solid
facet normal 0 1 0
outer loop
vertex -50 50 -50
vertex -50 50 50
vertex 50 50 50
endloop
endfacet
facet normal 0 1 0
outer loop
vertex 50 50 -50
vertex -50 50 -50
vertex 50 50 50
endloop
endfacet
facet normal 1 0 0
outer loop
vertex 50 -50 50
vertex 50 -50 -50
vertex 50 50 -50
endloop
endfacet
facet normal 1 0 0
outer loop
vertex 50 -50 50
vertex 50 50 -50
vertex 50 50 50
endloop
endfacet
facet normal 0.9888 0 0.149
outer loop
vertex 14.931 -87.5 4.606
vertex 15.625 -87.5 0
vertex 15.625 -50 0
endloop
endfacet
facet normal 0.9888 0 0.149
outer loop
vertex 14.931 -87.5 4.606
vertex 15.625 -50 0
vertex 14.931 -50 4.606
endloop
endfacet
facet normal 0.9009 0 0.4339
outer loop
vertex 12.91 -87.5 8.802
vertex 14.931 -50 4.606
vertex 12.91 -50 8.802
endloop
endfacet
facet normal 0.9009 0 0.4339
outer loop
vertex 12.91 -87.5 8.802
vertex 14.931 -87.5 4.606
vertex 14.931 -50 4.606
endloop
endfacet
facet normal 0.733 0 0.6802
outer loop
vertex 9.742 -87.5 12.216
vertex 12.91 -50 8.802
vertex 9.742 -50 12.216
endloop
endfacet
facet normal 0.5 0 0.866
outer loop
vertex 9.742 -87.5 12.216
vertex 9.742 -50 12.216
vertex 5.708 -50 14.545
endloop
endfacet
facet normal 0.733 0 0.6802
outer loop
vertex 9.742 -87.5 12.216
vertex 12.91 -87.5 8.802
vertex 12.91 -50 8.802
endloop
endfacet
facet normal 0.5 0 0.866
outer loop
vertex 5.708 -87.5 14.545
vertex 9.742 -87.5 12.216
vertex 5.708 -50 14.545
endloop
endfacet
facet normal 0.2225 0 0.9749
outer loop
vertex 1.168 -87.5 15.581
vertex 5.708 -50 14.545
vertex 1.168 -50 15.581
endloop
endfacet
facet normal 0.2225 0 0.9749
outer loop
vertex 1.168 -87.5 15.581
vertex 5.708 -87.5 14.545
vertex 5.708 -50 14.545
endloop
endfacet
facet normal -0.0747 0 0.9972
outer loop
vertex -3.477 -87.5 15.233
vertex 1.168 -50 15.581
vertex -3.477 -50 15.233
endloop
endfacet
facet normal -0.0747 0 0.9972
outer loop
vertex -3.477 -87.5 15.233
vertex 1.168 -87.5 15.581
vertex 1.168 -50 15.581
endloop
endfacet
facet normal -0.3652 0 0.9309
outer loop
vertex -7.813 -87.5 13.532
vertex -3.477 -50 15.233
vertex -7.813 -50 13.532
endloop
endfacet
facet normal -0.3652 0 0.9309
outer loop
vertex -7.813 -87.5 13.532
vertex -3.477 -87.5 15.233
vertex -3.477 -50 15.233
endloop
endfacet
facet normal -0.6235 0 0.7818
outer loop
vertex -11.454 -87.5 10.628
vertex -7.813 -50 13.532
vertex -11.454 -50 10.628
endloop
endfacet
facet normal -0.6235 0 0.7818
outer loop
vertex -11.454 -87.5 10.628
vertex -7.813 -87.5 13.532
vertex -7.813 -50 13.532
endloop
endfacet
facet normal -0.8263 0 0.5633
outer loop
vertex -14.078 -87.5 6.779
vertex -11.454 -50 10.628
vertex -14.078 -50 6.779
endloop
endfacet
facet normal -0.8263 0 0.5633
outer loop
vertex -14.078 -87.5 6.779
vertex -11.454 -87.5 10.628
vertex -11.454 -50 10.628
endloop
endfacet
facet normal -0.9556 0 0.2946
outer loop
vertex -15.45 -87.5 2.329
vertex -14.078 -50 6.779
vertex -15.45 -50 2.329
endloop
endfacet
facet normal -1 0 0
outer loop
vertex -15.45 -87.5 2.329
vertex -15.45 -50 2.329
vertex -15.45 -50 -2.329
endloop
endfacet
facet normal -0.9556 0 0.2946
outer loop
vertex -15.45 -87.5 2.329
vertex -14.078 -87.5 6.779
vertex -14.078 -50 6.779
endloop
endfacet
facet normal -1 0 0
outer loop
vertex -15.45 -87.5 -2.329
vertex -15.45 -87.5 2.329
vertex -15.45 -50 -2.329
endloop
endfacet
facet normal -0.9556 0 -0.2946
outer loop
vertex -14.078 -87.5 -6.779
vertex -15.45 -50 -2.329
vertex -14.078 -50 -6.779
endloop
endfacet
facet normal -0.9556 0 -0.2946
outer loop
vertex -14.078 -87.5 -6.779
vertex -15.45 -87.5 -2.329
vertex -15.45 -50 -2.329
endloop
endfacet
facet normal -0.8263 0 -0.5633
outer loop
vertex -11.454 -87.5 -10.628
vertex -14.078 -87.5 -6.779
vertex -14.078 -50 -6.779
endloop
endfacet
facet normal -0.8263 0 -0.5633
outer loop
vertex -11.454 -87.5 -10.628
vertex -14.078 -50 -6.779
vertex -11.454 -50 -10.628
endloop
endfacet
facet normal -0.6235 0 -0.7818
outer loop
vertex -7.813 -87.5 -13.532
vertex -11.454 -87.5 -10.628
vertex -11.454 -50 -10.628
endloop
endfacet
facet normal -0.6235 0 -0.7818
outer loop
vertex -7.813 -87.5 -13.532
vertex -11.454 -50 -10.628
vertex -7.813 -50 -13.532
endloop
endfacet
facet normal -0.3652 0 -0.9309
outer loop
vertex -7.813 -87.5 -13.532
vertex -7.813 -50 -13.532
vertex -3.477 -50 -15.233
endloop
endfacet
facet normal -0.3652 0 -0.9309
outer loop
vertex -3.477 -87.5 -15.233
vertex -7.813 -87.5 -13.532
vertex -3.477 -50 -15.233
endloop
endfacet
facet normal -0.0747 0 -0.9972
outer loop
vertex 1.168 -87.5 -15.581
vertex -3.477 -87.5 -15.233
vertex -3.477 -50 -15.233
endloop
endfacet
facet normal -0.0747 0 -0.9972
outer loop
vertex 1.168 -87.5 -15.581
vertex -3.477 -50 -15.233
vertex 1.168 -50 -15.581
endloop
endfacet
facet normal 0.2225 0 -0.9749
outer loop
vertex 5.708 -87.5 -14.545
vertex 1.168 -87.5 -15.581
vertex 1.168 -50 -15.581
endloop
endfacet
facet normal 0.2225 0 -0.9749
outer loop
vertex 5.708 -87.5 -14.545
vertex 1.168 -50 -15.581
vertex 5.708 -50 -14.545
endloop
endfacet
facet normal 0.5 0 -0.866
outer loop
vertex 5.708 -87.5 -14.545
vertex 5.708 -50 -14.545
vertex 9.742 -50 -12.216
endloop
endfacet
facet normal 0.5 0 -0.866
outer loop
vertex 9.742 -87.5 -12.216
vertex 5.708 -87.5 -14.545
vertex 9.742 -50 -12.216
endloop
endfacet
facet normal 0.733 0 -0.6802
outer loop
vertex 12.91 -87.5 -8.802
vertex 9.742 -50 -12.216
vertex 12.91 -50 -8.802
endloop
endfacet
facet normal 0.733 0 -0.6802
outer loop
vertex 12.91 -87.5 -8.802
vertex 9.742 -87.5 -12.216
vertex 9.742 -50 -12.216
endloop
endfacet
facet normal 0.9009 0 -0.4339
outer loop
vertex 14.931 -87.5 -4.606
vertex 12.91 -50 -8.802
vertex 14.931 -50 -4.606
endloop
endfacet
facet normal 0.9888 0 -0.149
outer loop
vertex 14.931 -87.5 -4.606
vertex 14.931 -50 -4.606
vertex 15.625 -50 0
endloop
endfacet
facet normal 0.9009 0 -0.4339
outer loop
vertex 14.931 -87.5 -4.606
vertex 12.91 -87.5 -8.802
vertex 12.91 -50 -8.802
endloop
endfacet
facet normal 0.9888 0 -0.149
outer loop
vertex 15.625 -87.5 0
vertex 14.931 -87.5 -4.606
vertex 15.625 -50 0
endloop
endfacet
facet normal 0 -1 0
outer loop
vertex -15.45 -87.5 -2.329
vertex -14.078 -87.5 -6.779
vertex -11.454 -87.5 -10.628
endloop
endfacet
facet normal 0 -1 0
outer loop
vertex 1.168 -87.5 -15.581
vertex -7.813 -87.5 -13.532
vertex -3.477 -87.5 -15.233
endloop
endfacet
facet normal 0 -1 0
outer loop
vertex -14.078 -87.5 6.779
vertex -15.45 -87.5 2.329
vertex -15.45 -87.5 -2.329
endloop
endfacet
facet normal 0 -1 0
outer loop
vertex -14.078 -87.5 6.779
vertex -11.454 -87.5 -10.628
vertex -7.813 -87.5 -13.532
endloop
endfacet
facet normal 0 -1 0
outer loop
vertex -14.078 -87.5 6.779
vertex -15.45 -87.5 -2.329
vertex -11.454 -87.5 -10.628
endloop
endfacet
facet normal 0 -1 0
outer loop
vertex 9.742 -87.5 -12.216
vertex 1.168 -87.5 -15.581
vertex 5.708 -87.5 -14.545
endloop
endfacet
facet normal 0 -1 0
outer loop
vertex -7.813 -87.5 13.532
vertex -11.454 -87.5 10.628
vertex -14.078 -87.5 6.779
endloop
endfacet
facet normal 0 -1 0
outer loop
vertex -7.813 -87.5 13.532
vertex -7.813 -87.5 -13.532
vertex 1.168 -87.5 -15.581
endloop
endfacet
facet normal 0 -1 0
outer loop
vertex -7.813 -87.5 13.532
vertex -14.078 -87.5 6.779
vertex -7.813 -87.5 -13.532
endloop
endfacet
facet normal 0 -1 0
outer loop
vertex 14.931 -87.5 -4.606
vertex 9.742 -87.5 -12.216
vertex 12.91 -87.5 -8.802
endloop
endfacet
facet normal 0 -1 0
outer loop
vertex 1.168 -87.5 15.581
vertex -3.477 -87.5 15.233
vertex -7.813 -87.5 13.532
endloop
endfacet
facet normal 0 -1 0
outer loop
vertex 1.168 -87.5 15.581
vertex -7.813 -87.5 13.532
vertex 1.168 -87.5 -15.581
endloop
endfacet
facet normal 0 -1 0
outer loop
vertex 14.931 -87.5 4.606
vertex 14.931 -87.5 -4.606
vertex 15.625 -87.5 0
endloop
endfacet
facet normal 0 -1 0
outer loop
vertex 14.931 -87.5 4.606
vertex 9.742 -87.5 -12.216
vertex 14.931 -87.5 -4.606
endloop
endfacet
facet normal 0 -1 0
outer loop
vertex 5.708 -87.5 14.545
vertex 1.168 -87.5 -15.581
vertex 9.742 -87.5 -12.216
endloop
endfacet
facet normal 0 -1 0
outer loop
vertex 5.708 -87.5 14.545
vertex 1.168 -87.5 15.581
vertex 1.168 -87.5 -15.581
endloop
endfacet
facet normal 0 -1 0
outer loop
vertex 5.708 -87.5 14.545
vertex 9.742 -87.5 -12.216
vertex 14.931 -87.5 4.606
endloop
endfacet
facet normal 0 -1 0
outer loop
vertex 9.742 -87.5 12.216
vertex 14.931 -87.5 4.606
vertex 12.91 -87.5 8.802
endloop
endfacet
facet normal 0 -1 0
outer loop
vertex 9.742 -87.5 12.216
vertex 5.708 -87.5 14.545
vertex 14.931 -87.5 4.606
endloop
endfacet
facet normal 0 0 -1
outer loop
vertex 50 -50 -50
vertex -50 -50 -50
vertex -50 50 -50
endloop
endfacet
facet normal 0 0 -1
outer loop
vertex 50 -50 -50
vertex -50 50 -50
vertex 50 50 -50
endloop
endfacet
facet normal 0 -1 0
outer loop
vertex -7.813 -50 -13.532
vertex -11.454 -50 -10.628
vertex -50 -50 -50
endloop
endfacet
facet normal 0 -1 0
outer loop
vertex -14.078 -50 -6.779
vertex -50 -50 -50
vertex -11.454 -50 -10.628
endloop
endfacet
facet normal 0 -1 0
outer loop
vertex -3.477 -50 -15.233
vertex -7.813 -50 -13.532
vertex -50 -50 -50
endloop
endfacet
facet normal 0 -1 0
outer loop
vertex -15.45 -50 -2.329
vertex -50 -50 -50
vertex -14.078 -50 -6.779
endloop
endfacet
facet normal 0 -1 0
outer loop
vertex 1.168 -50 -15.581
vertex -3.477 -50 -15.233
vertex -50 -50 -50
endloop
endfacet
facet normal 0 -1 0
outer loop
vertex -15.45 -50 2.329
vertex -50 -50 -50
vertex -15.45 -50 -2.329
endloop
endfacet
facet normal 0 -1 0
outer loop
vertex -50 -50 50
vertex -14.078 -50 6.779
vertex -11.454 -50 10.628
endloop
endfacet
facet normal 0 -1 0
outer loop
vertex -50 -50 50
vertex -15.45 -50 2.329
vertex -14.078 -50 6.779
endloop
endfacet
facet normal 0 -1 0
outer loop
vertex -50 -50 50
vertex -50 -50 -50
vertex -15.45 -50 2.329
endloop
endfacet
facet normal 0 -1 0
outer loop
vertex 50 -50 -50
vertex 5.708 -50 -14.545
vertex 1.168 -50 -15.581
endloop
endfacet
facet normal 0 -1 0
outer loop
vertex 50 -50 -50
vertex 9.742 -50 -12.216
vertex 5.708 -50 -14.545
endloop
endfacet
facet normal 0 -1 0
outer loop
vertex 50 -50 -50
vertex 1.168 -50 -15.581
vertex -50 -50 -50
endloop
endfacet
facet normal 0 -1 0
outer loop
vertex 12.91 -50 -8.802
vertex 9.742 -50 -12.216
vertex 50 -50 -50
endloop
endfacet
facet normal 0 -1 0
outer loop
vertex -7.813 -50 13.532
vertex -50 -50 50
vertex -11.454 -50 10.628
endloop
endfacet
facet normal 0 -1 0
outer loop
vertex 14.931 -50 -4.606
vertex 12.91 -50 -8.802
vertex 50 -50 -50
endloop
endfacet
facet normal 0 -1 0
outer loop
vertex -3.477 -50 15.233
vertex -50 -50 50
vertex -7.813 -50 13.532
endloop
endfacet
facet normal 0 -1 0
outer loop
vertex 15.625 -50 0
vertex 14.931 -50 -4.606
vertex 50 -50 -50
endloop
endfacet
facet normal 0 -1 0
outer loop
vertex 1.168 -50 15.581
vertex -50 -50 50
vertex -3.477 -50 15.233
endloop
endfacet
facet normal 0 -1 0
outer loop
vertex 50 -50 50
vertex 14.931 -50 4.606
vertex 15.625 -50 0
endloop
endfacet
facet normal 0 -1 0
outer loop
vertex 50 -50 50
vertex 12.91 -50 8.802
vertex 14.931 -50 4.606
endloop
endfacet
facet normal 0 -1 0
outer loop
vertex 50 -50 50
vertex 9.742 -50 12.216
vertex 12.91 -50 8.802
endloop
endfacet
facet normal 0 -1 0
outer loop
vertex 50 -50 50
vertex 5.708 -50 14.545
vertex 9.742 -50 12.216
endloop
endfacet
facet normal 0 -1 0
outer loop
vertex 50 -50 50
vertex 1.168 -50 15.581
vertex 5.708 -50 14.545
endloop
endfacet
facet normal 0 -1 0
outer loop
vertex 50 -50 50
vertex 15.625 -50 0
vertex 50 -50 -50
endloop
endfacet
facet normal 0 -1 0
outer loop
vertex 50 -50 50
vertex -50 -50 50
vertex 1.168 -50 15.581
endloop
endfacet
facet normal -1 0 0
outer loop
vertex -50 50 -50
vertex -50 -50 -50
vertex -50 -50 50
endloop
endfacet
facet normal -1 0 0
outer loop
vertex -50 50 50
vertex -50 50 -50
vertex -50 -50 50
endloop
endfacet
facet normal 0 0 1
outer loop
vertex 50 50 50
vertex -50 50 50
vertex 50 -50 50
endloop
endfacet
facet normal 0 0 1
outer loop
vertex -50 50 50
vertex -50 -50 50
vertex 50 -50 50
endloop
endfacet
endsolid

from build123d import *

# Parameters (mm, degrees)
F0_W     = 100
F0_H     = 100
F1_DEPTH = 50
F2_R     = 15.625
F3_DEPTH = 37.5
F2_R_2   = 31.25
F4_DEPTH = 50


with BuildPart() as f1:
    # F0 (on Front) → F1 (new body, symmetric)
    with BuildSketch(Plane.XZ):
        Rectangle(F0_W, F0_H)
    extrude(amount=F1_DEPTH, both=True)

    # F2 (on face) → F3 (join, symmetric)
    with BuildSketch(Plane.XZ.offset(50)):
        Circle(F2_R)
    extrude(amount=F3_DEPTH, both=True)

    # F2 (on face) → F4 (join)
    with BuildSketch(Plane.XZ.offset(50)):
        Circle(F2_R_2)
        Circle(F2_R, mode=Mode.SUBTRACT)
    extrude(amount=-F4_DEPTH)


solid = f1.part
